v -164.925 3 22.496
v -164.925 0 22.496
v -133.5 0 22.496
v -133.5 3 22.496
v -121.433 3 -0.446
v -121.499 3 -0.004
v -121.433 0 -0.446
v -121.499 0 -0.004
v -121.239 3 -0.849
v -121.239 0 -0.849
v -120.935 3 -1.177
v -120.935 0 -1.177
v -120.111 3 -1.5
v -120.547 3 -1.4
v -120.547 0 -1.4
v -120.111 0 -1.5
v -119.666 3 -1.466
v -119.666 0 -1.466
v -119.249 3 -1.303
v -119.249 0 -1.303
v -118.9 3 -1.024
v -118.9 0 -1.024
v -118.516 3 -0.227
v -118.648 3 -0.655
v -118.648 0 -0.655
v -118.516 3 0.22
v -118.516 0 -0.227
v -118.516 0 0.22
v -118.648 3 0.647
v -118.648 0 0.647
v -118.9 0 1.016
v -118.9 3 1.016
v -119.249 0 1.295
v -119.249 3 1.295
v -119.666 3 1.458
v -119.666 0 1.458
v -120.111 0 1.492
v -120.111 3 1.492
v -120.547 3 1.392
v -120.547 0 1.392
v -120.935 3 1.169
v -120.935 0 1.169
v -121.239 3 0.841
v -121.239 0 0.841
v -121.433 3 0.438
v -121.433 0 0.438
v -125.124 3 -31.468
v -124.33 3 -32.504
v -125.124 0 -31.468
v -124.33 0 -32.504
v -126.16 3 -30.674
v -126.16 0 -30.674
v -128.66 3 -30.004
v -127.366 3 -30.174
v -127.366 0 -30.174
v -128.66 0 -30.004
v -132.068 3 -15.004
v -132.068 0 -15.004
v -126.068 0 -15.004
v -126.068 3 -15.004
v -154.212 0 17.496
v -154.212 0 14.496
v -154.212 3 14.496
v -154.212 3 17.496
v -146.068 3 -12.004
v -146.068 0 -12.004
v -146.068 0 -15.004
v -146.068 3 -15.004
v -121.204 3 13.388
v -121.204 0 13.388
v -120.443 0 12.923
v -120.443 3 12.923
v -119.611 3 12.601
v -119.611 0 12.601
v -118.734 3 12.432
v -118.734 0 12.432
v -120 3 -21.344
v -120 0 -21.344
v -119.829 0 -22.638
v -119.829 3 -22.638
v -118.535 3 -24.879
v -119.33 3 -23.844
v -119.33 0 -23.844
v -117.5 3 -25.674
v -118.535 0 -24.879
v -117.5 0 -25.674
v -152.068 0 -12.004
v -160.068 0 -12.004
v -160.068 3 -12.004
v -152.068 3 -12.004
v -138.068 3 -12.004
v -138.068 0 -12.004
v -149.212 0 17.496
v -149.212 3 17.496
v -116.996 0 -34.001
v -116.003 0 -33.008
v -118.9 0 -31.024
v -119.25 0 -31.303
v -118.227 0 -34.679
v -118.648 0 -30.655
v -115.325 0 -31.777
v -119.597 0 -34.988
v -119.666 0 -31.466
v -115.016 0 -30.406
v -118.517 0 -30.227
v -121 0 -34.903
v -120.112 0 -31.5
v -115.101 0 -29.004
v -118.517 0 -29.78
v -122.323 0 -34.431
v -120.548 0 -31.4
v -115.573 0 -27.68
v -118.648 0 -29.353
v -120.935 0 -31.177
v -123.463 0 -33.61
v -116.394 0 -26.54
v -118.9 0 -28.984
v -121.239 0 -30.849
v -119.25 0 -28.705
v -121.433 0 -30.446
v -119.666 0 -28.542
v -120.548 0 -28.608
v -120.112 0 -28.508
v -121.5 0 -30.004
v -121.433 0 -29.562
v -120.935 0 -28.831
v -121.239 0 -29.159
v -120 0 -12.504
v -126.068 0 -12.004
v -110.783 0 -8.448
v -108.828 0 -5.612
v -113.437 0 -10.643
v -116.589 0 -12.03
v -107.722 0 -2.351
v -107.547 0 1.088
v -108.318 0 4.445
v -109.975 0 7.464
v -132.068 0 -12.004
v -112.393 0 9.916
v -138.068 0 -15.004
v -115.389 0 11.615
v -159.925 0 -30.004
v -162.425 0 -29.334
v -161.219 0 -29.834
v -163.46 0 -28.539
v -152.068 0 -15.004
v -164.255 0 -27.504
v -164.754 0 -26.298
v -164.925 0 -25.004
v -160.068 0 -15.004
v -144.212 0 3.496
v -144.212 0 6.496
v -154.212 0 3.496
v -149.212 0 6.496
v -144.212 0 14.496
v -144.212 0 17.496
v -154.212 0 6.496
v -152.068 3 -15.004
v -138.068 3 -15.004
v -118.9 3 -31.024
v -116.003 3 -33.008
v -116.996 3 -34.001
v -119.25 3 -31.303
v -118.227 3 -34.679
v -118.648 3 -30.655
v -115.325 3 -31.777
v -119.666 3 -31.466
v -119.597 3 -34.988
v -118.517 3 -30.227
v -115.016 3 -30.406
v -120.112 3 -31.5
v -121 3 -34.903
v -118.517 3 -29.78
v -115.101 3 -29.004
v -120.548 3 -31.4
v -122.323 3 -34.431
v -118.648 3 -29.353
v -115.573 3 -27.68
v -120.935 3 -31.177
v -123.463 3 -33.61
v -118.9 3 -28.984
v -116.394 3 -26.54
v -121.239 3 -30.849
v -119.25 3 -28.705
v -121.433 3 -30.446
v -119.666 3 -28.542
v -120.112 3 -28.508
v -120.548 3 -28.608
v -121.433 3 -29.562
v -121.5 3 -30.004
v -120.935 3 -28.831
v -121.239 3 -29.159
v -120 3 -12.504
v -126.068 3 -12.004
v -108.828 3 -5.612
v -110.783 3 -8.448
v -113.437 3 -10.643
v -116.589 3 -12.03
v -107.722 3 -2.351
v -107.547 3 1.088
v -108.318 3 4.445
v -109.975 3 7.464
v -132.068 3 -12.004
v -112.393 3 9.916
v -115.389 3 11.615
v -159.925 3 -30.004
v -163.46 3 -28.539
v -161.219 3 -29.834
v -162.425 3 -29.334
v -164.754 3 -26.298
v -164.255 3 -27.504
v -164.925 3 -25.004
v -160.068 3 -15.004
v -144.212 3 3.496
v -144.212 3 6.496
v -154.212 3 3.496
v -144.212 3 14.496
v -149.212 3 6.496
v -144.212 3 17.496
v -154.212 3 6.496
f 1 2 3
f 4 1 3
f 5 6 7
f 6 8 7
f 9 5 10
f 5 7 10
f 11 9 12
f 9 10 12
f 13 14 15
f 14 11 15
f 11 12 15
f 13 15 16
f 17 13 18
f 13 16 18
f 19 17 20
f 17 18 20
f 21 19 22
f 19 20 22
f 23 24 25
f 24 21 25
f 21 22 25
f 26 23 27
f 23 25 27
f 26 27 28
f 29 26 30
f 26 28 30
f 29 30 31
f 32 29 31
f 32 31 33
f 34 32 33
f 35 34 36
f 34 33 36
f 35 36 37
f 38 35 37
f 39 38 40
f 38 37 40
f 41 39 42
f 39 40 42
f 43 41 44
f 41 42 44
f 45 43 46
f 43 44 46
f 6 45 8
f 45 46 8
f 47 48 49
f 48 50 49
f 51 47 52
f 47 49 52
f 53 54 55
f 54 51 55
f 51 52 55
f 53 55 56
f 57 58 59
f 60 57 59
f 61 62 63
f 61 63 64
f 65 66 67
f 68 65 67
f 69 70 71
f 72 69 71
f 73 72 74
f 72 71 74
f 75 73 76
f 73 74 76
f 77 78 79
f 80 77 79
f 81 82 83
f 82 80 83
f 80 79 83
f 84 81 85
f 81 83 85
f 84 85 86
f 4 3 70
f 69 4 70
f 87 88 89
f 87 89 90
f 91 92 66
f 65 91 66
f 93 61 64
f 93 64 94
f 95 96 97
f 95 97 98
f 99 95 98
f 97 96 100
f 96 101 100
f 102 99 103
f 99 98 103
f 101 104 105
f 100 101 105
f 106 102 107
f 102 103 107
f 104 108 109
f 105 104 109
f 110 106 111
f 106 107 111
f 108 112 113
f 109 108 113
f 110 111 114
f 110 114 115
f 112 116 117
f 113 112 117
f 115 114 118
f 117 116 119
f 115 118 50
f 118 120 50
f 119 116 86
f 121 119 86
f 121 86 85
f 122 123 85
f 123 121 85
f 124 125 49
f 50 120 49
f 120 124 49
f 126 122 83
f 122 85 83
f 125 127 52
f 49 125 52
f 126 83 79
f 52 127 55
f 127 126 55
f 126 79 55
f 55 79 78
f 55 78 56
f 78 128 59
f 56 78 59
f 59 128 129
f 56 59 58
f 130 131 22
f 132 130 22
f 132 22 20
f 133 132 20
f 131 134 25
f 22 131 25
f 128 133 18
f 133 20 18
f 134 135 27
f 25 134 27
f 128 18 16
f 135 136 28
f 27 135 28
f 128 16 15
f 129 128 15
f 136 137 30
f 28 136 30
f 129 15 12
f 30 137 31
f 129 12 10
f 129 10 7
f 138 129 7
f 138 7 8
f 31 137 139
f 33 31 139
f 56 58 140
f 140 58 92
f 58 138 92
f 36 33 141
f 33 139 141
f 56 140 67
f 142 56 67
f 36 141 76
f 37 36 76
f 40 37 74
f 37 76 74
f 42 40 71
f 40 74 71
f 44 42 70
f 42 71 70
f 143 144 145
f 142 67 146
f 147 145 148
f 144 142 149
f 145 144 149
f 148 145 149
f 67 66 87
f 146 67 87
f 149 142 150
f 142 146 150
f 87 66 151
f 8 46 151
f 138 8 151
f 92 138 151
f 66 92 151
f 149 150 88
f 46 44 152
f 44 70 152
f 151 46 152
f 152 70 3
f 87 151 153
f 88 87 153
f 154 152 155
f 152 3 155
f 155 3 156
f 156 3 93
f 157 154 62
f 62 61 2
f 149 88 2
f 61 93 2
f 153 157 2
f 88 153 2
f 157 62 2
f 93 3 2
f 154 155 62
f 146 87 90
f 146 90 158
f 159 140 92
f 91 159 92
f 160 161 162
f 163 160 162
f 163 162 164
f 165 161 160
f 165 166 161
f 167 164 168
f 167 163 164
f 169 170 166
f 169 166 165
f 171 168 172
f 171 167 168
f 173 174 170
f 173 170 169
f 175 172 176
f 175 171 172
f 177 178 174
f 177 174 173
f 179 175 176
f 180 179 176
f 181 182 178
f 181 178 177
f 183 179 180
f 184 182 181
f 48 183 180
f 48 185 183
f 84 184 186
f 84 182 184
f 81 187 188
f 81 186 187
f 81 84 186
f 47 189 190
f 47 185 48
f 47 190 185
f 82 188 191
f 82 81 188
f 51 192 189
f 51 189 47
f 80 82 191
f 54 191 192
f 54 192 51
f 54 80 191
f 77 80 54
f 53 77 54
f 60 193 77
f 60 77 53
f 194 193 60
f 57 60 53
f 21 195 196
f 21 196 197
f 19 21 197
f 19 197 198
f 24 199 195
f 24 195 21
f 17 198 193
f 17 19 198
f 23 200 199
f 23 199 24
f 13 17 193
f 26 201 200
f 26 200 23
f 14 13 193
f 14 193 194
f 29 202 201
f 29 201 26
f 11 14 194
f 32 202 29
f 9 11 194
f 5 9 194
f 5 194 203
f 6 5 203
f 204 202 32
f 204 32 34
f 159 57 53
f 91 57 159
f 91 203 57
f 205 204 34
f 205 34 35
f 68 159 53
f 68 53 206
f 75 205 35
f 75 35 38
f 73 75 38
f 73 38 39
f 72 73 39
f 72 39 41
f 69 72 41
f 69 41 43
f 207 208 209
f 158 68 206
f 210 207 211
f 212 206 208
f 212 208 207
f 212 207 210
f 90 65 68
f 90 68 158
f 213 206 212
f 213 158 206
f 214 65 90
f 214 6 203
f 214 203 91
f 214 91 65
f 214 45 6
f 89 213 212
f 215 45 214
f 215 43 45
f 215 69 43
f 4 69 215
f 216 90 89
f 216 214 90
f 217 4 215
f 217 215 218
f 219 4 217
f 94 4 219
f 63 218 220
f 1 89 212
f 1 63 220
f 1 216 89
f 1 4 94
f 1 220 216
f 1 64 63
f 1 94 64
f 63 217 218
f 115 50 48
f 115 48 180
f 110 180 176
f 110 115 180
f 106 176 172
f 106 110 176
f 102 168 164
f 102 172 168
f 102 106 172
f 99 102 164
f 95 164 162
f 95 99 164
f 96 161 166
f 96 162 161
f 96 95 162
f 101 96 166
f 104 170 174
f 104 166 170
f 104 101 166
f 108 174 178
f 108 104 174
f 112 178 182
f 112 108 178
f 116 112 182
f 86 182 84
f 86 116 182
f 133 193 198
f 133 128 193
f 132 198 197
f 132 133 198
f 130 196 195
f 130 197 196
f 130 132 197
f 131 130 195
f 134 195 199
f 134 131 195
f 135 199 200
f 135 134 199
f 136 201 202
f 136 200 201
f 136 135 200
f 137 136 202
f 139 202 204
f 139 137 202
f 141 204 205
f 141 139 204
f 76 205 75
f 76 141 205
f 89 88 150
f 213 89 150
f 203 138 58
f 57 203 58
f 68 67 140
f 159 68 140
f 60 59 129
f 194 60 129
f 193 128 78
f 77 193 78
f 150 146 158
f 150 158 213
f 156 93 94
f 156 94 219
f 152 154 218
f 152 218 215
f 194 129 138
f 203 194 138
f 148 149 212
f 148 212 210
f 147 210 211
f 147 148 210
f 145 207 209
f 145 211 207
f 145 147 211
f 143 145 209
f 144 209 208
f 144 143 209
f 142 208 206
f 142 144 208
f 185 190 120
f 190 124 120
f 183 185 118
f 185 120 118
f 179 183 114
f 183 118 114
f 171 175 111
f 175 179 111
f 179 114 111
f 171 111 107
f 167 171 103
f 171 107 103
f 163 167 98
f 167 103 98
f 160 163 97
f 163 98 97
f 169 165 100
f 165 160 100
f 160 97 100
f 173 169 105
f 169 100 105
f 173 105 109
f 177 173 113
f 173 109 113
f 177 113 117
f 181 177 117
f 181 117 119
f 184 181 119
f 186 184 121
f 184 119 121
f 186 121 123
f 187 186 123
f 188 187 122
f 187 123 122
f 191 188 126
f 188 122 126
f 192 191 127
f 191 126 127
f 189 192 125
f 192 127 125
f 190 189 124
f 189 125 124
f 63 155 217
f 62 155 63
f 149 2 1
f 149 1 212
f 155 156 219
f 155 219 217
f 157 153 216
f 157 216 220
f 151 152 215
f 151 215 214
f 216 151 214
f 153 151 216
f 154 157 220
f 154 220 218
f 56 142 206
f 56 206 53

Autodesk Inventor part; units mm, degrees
ref_plane "YZ Plane" through (0, 0, 0) normal (1, 0, 0) x (0, 1, 0)
ref_plane "XZ Plane" through (0, 0, 0) normal (0, 1, 0) x (-1, 0, 0)
ref_plane "XY Plane" through (0, 0, 0) normal (0, 0, 1) x (1, 0, 0)
sketch "Boceto1" plane through (0, 0, 0) normal (0, 1, 0) x (-1, 0, 0)
  arc A0 (117.4998, -25.6738) -> (124.3299, -32.5039) centre (119.9998, -30.0039) ccw
  circle A1 centre (119.9998, -30.0039) radius 1.5
  line L0 (119.9998, -12.5039) -> (119.9998, -21.3437)
  arc A2 (117.4998, -25.6738) -> (119.9998, -21.3437) centre (114.9998, -21.3437) ccw
  arc A3 (128.66, -30.0039) -> (124.3299, -32.5039) centre (128.66, -35.0039) ccw
  arc A4 (118.7343, 12.4319) -> (119.9998, -12.5039) centre (119.9994, -0.0039) ccw
  line L1 (133.4998, 22.4961) -> (121.2045, 13.3885)
  line L2 (164.9248, 22.4961) -> (164.9248, -25.0039)
  line L3 (159.9248, -30.0039) -> (128.66, -30.0039)
  line L4 (164.9248, 22.4961) -> (133.4998, 22.4961)
  line L5 (149.2123, 17.4961) -> (144.2123, 17.4961)
  line L6 (144.2123, 17.4961) -> (144.2123, 14.4961)
  line L7 (144.2123, 14.4961) -> (154.2123, 14.4961)
  line L8 (154.2123, 14.4961) -> (154.2123, 17.4961)
  line L9 (154.2123, 17.4961) -> (149.2123, 17.4961)
  line L10 (149.2123, 6.4961) -> (144.2123, 6.4961)
  line L11 (144.2123, 6.4961) -> (144.2123, 3.4961)
  line L12 (144.2123, 3.4961) -> (154.2123, 3.4961)
  line L13 (154.2123, 3.4961) -> (154.2123, 6.4961)
  line L14 (154.2123, 6.4961) -> (149.2123, 6.4961)
  line L15 (160.0685, -12.0039) -> (160.0685, -15.0039)
  circle A5 centre (119.9994, -0.0039) radius 1.5
  line L16 (160.0685, -12.0039) -> (152.0685, -12.0039)
  line L17 (152.0685, -12.0039) -> (152.0685, -15.0039)
  line L18 (152.0685, -15.0039) -> (160.0685, -15.0039)
  line L19 (146.0685, -12.0039) -> (146.0685, -15.0039)
  line L20 (146.0685, -15.0039) -> (138.0685, -15.0039)
  line L21 (138.0685, -15.0039) -> (138.0685, -12.0039)
  line L22 (132.0685, -12.0039) -> (132.0685, -15.0039)
  line L23 (132.0685, -15.0039) -> (126.0685, -15.0039)
  line L24 (126.0685, -15.0039) -> (126.0685, -12.0039)
  line L25 (126.0685, -12.0039) -> (132.0685, -12.0039)
  line L26 (138.0685, -12.0039) -> (146.0685, -12.0039)
  arc A6 (159.9248, -30.0039) -> (164.9248, -25.0039) centre (159.9248, -25.0039) ccw
  arc A7 (118.7343, 12.4319) -> (121.2045, 13.3885) centre (118.2283, 17.4062) ccw
  point P0 (124.9998, -30.0039)
  point P1 (119.9998, -25.0039)
  point P2 (119.9998, 12.4961)
  dimension "d165" = 8
  dimension "d166" = 6
  dimension "d167" = 8
  dimension "d169" = 6
  dimension "d170" = 5
extrude "Extrusión1" add sketch "Boceto1" along normal blind 3
properties part number "codo"
